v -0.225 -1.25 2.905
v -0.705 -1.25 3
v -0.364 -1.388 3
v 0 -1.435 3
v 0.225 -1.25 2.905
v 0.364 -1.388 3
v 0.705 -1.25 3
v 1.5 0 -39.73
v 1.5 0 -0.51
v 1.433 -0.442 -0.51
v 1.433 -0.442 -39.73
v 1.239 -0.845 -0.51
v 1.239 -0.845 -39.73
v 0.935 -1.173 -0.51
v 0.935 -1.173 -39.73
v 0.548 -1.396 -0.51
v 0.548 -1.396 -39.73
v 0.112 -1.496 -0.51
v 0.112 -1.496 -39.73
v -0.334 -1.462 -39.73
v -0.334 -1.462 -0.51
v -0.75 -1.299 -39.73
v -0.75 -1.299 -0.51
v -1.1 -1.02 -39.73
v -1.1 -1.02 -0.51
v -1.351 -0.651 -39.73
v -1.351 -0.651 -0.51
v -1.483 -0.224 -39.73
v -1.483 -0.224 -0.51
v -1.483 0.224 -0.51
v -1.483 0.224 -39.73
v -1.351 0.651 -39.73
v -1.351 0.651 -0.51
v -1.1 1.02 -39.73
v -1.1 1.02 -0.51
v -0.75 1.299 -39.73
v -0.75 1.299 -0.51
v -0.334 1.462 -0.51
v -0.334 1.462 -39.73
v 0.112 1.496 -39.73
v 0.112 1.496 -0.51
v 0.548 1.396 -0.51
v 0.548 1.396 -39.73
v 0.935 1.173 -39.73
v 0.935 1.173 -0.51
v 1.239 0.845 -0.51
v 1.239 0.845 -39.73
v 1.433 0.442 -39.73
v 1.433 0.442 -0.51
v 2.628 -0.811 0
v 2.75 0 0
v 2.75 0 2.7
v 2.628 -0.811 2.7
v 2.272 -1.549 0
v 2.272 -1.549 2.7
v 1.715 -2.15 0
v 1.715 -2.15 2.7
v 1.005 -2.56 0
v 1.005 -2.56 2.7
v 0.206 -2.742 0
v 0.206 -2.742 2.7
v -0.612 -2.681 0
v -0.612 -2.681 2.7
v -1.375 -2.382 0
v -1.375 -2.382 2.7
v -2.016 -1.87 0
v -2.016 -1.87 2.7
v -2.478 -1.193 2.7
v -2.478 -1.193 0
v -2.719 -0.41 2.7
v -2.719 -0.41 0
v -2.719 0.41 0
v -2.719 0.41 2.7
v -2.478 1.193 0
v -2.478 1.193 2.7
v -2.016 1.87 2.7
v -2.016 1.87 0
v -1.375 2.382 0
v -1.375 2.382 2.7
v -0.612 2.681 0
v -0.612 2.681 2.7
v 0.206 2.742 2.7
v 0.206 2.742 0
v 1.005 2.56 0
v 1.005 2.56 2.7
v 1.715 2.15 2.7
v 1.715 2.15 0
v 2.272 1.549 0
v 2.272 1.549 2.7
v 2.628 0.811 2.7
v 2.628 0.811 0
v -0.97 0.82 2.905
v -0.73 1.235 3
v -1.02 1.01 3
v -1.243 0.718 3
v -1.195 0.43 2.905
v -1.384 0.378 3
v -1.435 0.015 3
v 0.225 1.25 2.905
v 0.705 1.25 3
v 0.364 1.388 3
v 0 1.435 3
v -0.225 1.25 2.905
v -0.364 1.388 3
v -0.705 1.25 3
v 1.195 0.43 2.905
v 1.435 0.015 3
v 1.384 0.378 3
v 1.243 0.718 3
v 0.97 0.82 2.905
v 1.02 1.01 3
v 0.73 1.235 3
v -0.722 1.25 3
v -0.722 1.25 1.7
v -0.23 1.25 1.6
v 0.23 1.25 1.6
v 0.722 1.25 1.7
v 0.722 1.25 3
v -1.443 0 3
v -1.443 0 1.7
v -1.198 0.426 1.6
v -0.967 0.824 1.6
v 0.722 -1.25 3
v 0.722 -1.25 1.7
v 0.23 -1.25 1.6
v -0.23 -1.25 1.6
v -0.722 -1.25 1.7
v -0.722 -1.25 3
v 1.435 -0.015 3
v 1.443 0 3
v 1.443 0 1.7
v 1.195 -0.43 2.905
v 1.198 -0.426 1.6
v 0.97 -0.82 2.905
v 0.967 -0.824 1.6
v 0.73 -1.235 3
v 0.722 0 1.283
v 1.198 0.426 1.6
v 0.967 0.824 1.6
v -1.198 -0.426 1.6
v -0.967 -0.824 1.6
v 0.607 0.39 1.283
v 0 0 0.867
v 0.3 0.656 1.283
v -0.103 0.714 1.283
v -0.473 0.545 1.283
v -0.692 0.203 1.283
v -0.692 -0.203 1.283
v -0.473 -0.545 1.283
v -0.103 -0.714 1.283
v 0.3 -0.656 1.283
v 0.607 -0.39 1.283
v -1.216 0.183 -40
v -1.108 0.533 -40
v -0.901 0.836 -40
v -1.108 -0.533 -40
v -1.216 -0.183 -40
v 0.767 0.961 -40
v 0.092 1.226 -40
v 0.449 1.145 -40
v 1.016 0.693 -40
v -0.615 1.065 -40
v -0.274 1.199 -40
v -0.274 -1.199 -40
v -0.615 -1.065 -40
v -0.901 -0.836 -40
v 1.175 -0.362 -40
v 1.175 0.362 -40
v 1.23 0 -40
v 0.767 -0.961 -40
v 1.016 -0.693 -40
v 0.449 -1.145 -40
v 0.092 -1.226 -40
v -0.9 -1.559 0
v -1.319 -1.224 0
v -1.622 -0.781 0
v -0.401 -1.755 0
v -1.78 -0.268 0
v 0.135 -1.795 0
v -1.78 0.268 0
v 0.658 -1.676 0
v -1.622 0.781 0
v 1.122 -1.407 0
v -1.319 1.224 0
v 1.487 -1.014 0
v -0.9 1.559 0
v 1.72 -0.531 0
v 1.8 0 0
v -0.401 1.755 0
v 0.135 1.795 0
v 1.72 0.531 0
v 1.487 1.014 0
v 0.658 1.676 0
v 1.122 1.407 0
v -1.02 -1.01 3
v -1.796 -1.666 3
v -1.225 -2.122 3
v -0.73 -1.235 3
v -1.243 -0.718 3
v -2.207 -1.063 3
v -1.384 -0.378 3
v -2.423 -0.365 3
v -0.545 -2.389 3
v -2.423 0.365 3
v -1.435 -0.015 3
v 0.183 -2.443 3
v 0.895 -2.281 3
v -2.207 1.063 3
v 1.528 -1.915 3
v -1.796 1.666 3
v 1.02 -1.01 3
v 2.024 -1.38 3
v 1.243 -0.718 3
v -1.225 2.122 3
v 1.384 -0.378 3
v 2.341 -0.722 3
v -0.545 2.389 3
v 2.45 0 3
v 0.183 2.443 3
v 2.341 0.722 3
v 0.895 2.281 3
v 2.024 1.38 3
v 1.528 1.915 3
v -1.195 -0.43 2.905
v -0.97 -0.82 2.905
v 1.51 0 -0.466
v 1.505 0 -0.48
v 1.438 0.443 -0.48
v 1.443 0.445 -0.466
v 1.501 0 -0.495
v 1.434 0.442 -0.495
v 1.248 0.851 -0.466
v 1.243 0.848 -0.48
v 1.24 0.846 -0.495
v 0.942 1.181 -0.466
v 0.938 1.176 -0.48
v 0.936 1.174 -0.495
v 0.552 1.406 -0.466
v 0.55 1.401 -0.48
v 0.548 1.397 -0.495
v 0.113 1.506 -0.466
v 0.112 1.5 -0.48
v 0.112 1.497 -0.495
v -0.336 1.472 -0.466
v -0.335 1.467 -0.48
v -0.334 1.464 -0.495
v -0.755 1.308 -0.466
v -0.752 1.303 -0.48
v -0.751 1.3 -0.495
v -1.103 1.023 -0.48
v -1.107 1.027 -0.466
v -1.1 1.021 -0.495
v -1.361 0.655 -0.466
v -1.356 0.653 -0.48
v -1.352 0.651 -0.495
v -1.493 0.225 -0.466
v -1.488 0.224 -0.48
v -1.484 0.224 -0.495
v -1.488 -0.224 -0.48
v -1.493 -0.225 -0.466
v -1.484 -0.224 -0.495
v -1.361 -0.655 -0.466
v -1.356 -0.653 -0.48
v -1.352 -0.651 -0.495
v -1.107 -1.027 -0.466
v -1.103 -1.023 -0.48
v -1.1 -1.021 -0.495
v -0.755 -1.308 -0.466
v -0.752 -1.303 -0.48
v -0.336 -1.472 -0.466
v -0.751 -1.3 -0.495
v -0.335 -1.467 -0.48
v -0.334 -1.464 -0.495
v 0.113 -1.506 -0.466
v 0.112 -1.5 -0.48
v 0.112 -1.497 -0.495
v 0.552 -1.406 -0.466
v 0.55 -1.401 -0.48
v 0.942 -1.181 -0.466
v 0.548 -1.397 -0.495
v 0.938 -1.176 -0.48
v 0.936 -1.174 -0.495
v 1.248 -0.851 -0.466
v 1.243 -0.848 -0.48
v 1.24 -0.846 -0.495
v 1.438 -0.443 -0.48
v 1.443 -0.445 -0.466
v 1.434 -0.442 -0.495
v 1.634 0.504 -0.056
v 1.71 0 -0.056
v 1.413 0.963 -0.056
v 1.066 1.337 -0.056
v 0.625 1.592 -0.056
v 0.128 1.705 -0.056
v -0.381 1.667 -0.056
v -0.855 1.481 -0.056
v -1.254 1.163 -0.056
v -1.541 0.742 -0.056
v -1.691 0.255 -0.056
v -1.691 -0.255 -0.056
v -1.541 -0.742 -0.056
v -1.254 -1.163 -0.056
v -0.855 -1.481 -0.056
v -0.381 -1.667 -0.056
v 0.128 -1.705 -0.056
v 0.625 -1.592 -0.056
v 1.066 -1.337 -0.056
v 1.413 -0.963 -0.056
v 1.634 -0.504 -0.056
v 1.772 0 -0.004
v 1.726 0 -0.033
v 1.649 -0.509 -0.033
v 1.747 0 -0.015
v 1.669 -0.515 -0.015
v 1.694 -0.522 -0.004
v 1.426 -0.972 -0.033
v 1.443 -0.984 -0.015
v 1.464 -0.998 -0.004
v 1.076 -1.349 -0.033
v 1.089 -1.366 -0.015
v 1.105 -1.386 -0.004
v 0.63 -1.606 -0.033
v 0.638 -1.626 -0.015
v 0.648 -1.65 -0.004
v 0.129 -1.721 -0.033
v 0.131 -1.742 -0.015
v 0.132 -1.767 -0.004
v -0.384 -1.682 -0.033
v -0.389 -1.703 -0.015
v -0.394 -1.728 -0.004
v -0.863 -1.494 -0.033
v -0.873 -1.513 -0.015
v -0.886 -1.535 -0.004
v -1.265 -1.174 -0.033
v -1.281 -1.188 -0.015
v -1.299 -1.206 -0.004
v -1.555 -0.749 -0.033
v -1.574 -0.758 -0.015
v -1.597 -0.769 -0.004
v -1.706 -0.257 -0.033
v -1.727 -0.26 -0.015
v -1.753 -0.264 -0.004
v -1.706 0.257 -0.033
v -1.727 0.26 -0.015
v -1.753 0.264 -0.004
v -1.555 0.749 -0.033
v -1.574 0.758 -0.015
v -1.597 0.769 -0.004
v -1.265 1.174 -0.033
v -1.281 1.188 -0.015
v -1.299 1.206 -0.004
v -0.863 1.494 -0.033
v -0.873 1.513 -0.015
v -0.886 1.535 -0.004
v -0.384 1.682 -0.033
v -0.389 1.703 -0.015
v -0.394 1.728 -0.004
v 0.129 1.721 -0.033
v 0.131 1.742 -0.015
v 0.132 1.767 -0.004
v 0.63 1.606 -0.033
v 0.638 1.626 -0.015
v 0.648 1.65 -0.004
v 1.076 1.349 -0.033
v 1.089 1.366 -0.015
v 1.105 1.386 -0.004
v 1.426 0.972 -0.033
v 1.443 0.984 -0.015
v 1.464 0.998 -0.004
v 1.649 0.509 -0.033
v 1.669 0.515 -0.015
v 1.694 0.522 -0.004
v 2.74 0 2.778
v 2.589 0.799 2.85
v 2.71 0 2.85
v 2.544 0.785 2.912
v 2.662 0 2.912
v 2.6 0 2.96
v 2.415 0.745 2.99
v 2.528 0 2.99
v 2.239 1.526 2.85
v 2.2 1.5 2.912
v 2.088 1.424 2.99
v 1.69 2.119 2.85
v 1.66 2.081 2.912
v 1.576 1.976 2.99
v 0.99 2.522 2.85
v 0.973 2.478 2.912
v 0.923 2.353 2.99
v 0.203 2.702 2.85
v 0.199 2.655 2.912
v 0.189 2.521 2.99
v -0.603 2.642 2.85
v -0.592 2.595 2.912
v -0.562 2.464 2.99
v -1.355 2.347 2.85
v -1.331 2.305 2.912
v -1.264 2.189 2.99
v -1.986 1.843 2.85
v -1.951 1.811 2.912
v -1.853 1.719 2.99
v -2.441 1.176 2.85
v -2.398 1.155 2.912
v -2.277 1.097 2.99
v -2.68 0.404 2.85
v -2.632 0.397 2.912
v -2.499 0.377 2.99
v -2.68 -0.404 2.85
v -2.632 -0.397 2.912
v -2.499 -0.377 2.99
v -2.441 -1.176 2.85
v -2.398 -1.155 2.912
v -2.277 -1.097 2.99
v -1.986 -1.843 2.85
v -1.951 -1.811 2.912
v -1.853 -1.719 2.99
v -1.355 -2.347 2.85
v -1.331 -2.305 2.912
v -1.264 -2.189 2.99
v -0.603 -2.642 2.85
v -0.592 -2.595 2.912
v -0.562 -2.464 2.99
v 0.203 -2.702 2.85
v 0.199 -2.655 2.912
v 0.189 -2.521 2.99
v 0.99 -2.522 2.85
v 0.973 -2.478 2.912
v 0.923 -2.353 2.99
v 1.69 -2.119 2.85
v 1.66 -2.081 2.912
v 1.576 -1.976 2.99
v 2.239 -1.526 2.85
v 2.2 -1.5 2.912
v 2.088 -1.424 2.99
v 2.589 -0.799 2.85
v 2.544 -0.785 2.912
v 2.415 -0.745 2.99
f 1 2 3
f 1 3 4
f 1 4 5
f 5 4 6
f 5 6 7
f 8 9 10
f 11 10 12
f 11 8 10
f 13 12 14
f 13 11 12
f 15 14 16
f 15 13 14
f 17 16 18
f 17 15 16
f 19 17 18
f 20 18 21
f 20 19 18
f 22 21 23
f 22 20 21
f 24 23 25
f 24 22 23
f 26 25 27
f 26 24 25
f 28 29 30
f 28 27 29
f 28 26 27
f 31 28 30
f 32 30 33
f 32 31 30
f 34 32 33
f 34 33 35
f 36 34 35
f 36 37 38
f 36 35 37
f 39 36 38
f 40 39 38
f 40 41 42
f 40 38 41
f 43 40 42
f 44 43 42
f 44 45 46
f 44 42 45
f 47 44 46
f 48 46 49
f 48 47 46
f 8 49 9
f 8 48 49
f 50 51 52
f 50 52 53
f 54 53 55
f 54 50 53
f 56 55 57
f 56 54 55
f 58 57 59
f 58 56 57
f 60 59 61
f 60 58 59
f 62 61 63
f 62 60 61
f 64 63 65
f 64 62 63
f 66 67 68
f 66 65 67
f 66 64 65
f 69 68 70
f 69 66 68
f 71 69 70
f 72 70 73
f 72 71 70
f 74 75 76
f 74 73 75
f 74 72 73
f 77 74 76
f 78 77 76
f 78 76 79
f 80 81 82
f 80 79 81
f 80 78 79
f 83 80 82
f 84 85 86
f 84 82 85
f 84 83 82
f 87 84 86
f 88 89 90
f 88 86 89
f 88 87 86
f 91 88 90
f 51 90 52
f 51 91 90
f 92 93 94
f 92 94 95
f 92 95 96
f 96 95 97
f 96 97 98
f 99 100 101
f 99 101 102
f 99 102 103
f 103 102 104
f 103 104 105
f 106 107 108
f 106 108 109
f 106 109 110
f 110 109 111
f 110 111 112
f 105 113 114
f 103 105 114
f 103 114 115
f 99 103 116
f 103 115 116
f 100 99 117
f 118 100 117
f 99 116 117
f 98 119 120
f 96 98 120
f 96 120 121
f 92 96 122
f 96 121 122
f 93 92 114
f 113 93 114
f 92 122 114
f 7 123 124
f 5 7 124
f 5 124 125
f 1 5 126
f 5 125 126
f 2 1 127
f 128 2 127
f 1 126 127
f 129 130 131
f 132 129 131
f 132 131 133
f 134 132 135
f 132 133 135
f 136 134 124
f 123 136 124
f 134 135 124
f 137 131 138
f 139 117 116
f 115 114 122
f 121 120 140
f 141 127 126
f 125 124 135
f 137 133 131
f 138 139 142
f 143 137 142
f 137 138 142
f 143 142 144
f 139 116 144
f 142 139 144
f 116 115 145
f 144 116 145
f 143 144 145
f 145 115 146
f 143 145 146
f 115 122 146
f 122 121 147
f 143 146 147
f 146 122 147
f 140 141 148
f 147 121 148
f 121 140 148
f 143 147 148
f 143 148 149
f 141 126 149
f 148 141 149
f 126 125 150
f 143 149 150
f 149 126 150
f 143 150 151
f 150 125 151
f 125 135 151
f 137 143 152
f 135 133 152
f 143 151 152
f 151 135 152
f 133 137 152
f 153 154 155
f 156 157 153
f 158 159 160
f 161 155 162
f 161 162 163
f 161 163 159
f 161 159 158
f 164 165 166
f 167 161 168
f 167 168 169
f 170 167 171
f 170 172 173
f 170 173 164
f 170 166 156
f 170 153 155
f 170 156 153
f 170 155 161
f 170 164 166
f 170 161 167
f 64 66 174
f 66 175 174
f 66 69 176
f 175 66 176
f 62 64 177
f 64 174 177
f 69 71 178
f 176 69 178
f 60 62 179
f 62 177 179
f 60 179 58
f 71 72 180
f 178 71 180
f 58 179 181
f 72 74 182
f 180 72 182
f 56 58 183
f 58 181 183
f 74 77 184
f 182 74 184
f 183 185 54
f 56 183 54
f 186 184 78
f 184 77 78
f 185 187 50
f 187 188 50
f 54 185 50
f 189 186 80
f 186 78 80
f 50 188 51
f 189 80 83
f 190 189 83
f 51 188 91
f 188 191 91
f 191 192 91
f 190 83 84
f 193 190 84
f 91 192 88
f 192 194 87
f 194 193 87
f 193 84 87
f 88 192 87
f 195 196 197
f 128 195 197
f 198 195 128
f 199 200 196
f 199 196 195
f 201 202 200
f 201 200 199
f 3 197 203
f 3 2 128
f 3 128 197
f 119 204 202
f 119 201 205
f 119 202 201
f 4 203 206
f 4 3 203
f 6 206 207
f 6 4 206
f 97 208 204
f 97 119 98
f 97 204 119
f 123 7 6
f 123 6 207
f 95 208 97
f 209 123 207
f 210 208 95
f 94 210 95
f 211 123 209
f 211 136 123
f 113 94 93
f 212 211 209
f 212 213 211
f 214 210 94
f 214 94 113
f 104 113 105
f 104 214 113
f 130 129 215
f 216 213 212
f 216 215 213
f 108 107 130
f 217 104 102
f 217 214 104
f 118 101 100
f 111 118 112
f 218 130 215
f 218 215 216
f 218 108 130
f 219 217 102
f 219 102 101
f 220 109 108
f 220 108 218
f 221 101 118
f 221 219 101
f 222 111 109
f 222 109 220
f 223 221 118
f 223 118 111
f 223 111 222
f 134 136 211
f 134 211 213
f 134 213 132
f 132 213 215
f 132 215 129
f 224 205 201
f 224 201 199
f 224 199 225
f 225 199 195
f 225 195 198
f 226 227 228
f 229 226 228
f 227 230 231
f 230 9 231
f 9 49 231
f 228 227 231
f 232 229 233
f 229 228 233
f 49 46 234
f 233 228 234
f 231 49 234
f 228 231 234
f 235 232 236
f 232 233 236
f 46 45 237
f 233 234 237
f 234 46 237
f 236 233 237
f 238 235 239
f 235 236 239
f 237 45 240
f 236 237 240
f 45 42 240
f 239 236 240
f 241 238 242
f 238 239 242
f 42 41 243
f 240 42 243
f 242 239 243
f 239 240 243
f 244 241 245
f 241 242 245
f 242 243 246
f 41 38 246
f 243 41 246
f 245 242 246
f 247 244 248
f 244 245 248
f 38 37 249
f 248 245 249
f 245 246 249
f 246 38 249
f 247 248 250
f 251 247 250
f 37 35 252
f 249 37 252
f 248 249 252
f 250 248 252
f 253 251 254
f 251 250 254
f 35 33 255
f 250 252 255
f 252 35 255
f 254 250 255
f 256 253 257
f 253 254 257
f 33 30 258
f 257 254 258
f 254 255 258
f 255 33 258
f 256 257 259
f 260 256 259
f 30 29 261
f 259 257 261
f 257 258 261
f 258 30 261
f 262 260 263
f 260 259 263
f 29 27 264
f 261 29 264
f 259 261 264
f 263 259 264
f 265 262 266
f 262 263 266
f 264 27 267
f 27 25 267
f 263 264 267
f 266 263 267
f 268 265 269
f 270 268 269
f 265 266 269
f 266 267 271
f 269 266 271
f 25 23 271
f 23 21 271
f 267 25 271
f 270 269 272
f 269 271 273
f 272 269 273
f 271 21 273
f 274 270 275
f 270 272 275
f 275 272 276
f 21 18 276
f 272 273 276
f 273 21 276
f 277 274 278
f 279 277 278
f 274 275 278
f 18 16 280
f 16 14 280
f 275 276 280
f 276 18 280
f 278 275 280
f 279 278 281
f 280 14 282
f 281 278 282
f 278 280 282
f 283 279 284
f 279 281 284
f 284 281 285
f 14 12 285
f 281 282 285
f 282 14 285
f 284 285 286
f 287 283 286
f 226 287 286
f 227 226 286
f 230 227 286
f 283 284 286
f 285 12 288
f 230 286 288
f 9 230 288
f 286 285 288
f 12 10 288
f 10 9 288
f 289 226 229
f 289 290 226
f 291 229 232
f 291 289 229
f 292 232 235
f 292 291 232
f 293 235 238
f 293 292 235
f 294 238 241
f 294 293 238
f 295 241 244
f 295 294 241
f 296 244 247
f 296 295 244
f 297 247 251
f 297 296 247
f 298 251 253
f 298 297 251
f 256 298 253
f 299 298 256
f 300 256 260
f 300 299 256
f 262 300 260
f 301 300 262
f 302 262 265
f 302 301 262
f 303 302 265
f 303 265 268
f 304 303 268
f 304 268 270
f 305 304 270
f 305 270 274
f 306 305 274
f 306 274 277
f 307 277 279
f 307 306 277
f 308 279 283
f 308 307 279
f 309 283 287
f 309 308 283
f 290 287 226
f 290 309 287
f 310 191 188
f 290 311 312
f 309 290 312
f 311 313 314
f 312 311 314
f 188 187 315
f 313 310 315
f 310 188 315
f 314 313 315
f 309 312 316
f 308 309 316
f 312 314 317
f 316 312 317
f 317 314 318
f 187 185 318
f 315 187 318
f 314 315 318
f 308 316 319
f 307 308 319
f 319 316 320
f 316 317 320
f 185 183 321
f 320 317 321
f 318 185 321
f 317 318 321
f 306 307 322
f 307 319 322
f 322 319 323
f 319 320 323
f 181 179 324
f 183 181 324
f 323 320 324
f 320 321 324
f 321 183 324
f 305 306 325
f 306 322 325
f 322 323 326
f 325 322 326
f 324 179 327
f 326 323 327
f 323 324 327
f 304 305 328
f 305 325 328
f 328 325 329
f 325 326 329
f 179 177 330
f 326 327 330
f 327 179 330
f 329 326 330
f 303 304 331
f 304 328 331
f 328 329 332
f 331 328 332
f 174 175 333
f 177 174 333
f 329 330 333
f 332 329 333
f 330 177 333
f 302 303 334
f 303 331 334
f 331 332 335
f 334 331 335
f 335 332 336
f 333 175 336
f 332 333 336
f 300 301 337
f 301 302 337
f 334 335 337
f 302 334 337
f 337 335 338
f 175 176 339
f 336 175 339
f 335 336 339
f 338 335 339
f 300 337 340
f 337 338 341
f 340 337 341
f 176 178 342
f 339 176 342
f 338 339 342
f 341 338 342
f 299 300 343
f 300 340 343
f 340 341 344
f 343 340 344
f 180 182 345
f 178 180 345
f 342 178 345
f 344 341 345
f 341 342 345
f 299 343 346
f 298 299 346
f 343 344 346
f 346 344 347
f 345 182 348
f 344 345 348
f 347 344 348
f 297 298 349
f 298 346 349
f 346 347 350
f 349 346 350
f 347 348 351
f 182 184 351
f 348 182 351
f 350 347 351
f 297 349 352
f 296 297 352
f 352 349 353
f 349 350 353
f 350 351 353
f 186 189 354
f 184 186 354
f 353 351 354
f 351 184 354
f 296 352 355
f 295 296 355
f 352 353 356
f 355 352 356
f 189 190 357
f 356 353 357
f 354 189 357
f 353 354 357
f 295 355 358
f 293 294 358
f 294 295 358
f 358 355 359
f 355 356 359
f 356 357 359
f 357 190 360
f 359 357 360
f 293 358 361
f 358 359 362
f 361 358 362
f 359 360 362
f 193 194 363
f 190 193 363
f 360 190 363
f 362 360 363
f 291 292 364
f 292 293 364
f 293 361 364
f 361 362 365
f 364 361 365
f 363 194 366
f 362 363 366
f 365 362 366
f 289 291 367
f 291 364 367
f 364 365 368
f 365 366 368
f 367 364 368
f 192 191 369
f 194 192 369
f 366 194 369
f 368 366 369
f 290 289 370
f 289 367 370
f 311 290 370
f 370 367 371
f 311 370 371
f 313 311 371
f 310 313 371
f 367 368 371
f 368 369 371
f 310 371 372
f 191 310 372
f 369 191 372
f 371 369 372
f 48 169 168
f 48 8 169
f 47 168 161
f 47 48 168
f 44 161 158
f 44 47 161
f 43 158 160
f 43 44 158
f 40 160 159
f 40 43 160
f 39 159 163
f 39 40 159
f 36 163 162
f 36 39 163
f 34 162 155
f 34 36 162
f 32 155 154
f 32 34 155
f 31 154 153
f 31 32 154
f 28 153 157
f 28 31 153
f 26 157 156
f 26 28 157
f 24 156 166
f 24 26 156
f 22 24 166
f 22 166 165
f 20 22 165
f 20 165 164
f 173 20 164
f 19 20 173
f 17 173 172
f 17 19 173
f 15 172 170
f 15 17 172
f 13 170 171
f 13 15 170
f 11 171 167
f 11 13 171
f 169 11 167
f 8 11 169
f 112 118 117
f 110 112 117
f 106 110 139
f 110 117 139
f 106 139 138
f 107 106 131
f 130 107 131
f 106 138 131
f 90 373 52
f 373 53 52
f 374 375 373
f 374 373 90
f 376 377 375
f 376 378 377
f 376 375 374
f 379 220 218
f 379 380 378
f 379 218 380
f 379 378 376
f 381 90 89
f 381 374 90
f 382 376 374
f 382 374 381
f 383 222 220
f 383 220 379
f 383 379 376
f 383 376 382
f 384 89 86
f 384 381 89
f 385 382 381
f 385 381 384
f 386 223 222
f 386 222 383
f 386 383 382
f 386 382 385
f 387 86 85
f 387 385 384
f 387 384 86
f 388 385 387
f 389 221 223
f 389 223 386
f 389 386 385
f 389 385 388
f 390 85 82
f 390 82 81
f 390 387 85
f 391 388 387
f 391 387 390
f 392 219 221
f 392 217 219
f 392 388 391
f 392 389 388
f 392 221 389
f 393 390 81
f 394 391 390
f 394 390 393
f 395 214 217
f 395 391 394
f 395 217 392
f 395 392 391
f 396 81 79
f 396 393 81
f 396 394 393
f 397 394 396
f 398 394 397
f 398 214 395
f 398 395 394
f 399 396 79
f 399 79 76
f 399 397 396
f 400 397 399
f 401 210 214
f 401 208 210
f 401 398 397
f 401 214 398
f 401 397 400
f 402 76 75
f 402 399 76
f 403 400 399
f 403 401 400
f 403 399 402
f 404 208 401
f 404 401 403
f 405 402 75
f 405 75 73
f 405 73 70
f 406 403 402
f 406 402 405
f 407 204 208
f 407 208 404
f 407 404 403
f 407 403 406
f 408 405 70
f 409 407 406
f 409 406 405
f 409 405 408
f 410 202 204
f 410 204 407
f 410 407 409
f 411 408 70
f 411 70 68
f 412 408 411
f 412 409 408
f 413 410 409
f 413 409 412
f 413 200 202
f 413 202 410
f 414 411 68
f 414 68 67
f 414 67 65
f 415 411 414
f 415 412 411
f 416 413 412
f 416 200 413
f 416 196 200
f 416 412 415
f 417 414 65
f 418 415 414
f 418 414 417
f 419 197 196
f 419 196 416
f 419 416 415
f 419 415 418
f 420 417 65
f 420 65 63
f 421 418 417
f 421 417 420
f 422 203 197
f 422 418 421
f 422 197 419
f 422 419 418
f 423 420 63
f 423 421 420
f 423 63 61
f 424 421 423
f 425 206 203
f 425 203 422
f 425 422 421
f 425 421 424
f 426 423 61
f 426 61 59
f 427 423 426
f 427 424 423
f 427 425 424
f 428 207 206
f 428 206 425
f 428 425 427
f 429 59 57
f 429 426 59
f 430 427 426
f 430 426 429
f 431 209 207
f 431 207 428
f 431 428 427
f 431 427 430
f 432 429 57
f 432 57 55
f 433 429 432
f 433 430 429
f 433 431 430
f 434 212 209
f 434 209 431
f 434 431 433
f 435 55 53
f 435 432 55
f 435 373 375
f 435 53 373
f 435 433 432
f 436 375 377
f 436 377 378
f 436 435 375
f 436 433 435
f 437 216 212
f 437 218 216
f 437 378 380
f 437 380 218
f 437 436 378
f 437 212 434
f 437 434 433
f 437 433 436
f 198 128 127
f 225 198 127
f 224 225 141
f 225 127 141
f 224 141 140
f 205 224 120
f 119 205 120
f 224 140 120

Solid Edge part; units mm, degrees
sketch "Sketch1" plane through (0, 0, 0) normal (0, 0, 1) x (1, 0, 0)
  line L0 (-0.7217, 1.25) -> (0.7217, 1.25)
  line L1 (0.7217, 1.25) -> (1.4434, 0)
  line L2 (1.4434, 0) -> (0.7217, -1.25)
  line L3 (0.7217, -1.25) -> (-0.7217, -1.25)
  line L4 (-0.7217, -1.25) -> (-1.4434, 0)
  line L5 (-1.4434, 0) -> (-0.7217, 1.25)
  circle A0 centre (0, 0) radius 2.75
  dimension "D1" = 5.5
  dimension "D2" = 2.5
extrude "Protrusion1" add sketch "Sketch1" along normal blind 3
sketch "Sketch2" plane through (0, 0, 0) normal (0, -1, 0) x (1, 0, 0)
  line L0 (0, 0.8667) -> (1.4434, 1.7)
  line L1 (1.4434, 1.7) -> (2.75, 1.7)
  line L2 (2.75, 1.7) -> (2.75, 0)
  line L3 (2.75, 0) -> (1.5, 0)
  line L4 (1.5, 0) -> (1.5, -21.999)
  line L5 (1.5, -21.999) -> (1.5, -22) construction
  line L6 (1.5, -22) -> (1.5, -22) construction
  line L7 (1.5, -22) -> (1.5, -40)
  line L8 (0, -40) -> (1.5, -40)
  dimension "D1" = 18
  dimension "D2" = 1.5
  dimension "D3" = 1.5
  dimension "D4" = 2.75
  dimension "D5" = 1.7
  dimension "D6" = 41.7
  dimension "D7" = 0.001
  dimension "D8" = 1.25
  dimension "D9" = 1.25
revolve "RevolvedProtrusion_1" add sketch "Sketch2" angle 360 about axis through (0, 0, 2.3333) along (0, 0, -1)
cosmetic_thread "Thread_1" size "M3" thread depth 17.999
sketch "Sketch3" plane through (0, 0, 0) normal (0, -1, 0) x (1, 0, 0)
  line L0 (0, 4) -> (1.435, 4)
  line L1 (1.435, 4) -> (1.435, 3)
  line L2 (1.435, 3) -> (0, 2.1715)
  dimension "D1" = 1.435
  dimension "D2" = 1
  dimension "D3" = 4
revolve "RevolvedCutout_1" cut sketch "Sketch3" angle 360 about axis through (0, 0, 7.1999) along (0, 0, 1)
fillet "Round_1" radius 0.3 1 edges at (-2.75, 0, 3)
sketch "Sketch4" plane through (0, 0, 0) normal (0, -1, 0) x (1, 0, 0)
  line L0 (1.5, 0) -> (1.8, 0)
  arc A0 (1.7101, -0.0562) -> (1.8, 0) centre (1.8, -0.1) cw
  line L1 (1.5101, -0.4662) -> (1.7101, -0.0562)
  arc A1 (1.5101, -0.4662) -> (1.5, -0.51) centre (1.6, -0.51) ccw
  line L2 (1.5, 0) -> (1.5, -0.51)
  dimension "D1" = 0.51
  dimension "D2" = 1.5
  dimension "D3" = 0.51
  dimension "D4" = 0.3
  dimension "D5" = 0.1
revolve "RevolvedProtrusion_2" add sketch "Sketch4" angle 360 about axis through (0, 0, -1.02) along (0, 0, 1)
chamfer "Chamfer_1" distance 0.2705 angle 45 1 edges at (-1.5, 0, -40)
properties material "Steel"
